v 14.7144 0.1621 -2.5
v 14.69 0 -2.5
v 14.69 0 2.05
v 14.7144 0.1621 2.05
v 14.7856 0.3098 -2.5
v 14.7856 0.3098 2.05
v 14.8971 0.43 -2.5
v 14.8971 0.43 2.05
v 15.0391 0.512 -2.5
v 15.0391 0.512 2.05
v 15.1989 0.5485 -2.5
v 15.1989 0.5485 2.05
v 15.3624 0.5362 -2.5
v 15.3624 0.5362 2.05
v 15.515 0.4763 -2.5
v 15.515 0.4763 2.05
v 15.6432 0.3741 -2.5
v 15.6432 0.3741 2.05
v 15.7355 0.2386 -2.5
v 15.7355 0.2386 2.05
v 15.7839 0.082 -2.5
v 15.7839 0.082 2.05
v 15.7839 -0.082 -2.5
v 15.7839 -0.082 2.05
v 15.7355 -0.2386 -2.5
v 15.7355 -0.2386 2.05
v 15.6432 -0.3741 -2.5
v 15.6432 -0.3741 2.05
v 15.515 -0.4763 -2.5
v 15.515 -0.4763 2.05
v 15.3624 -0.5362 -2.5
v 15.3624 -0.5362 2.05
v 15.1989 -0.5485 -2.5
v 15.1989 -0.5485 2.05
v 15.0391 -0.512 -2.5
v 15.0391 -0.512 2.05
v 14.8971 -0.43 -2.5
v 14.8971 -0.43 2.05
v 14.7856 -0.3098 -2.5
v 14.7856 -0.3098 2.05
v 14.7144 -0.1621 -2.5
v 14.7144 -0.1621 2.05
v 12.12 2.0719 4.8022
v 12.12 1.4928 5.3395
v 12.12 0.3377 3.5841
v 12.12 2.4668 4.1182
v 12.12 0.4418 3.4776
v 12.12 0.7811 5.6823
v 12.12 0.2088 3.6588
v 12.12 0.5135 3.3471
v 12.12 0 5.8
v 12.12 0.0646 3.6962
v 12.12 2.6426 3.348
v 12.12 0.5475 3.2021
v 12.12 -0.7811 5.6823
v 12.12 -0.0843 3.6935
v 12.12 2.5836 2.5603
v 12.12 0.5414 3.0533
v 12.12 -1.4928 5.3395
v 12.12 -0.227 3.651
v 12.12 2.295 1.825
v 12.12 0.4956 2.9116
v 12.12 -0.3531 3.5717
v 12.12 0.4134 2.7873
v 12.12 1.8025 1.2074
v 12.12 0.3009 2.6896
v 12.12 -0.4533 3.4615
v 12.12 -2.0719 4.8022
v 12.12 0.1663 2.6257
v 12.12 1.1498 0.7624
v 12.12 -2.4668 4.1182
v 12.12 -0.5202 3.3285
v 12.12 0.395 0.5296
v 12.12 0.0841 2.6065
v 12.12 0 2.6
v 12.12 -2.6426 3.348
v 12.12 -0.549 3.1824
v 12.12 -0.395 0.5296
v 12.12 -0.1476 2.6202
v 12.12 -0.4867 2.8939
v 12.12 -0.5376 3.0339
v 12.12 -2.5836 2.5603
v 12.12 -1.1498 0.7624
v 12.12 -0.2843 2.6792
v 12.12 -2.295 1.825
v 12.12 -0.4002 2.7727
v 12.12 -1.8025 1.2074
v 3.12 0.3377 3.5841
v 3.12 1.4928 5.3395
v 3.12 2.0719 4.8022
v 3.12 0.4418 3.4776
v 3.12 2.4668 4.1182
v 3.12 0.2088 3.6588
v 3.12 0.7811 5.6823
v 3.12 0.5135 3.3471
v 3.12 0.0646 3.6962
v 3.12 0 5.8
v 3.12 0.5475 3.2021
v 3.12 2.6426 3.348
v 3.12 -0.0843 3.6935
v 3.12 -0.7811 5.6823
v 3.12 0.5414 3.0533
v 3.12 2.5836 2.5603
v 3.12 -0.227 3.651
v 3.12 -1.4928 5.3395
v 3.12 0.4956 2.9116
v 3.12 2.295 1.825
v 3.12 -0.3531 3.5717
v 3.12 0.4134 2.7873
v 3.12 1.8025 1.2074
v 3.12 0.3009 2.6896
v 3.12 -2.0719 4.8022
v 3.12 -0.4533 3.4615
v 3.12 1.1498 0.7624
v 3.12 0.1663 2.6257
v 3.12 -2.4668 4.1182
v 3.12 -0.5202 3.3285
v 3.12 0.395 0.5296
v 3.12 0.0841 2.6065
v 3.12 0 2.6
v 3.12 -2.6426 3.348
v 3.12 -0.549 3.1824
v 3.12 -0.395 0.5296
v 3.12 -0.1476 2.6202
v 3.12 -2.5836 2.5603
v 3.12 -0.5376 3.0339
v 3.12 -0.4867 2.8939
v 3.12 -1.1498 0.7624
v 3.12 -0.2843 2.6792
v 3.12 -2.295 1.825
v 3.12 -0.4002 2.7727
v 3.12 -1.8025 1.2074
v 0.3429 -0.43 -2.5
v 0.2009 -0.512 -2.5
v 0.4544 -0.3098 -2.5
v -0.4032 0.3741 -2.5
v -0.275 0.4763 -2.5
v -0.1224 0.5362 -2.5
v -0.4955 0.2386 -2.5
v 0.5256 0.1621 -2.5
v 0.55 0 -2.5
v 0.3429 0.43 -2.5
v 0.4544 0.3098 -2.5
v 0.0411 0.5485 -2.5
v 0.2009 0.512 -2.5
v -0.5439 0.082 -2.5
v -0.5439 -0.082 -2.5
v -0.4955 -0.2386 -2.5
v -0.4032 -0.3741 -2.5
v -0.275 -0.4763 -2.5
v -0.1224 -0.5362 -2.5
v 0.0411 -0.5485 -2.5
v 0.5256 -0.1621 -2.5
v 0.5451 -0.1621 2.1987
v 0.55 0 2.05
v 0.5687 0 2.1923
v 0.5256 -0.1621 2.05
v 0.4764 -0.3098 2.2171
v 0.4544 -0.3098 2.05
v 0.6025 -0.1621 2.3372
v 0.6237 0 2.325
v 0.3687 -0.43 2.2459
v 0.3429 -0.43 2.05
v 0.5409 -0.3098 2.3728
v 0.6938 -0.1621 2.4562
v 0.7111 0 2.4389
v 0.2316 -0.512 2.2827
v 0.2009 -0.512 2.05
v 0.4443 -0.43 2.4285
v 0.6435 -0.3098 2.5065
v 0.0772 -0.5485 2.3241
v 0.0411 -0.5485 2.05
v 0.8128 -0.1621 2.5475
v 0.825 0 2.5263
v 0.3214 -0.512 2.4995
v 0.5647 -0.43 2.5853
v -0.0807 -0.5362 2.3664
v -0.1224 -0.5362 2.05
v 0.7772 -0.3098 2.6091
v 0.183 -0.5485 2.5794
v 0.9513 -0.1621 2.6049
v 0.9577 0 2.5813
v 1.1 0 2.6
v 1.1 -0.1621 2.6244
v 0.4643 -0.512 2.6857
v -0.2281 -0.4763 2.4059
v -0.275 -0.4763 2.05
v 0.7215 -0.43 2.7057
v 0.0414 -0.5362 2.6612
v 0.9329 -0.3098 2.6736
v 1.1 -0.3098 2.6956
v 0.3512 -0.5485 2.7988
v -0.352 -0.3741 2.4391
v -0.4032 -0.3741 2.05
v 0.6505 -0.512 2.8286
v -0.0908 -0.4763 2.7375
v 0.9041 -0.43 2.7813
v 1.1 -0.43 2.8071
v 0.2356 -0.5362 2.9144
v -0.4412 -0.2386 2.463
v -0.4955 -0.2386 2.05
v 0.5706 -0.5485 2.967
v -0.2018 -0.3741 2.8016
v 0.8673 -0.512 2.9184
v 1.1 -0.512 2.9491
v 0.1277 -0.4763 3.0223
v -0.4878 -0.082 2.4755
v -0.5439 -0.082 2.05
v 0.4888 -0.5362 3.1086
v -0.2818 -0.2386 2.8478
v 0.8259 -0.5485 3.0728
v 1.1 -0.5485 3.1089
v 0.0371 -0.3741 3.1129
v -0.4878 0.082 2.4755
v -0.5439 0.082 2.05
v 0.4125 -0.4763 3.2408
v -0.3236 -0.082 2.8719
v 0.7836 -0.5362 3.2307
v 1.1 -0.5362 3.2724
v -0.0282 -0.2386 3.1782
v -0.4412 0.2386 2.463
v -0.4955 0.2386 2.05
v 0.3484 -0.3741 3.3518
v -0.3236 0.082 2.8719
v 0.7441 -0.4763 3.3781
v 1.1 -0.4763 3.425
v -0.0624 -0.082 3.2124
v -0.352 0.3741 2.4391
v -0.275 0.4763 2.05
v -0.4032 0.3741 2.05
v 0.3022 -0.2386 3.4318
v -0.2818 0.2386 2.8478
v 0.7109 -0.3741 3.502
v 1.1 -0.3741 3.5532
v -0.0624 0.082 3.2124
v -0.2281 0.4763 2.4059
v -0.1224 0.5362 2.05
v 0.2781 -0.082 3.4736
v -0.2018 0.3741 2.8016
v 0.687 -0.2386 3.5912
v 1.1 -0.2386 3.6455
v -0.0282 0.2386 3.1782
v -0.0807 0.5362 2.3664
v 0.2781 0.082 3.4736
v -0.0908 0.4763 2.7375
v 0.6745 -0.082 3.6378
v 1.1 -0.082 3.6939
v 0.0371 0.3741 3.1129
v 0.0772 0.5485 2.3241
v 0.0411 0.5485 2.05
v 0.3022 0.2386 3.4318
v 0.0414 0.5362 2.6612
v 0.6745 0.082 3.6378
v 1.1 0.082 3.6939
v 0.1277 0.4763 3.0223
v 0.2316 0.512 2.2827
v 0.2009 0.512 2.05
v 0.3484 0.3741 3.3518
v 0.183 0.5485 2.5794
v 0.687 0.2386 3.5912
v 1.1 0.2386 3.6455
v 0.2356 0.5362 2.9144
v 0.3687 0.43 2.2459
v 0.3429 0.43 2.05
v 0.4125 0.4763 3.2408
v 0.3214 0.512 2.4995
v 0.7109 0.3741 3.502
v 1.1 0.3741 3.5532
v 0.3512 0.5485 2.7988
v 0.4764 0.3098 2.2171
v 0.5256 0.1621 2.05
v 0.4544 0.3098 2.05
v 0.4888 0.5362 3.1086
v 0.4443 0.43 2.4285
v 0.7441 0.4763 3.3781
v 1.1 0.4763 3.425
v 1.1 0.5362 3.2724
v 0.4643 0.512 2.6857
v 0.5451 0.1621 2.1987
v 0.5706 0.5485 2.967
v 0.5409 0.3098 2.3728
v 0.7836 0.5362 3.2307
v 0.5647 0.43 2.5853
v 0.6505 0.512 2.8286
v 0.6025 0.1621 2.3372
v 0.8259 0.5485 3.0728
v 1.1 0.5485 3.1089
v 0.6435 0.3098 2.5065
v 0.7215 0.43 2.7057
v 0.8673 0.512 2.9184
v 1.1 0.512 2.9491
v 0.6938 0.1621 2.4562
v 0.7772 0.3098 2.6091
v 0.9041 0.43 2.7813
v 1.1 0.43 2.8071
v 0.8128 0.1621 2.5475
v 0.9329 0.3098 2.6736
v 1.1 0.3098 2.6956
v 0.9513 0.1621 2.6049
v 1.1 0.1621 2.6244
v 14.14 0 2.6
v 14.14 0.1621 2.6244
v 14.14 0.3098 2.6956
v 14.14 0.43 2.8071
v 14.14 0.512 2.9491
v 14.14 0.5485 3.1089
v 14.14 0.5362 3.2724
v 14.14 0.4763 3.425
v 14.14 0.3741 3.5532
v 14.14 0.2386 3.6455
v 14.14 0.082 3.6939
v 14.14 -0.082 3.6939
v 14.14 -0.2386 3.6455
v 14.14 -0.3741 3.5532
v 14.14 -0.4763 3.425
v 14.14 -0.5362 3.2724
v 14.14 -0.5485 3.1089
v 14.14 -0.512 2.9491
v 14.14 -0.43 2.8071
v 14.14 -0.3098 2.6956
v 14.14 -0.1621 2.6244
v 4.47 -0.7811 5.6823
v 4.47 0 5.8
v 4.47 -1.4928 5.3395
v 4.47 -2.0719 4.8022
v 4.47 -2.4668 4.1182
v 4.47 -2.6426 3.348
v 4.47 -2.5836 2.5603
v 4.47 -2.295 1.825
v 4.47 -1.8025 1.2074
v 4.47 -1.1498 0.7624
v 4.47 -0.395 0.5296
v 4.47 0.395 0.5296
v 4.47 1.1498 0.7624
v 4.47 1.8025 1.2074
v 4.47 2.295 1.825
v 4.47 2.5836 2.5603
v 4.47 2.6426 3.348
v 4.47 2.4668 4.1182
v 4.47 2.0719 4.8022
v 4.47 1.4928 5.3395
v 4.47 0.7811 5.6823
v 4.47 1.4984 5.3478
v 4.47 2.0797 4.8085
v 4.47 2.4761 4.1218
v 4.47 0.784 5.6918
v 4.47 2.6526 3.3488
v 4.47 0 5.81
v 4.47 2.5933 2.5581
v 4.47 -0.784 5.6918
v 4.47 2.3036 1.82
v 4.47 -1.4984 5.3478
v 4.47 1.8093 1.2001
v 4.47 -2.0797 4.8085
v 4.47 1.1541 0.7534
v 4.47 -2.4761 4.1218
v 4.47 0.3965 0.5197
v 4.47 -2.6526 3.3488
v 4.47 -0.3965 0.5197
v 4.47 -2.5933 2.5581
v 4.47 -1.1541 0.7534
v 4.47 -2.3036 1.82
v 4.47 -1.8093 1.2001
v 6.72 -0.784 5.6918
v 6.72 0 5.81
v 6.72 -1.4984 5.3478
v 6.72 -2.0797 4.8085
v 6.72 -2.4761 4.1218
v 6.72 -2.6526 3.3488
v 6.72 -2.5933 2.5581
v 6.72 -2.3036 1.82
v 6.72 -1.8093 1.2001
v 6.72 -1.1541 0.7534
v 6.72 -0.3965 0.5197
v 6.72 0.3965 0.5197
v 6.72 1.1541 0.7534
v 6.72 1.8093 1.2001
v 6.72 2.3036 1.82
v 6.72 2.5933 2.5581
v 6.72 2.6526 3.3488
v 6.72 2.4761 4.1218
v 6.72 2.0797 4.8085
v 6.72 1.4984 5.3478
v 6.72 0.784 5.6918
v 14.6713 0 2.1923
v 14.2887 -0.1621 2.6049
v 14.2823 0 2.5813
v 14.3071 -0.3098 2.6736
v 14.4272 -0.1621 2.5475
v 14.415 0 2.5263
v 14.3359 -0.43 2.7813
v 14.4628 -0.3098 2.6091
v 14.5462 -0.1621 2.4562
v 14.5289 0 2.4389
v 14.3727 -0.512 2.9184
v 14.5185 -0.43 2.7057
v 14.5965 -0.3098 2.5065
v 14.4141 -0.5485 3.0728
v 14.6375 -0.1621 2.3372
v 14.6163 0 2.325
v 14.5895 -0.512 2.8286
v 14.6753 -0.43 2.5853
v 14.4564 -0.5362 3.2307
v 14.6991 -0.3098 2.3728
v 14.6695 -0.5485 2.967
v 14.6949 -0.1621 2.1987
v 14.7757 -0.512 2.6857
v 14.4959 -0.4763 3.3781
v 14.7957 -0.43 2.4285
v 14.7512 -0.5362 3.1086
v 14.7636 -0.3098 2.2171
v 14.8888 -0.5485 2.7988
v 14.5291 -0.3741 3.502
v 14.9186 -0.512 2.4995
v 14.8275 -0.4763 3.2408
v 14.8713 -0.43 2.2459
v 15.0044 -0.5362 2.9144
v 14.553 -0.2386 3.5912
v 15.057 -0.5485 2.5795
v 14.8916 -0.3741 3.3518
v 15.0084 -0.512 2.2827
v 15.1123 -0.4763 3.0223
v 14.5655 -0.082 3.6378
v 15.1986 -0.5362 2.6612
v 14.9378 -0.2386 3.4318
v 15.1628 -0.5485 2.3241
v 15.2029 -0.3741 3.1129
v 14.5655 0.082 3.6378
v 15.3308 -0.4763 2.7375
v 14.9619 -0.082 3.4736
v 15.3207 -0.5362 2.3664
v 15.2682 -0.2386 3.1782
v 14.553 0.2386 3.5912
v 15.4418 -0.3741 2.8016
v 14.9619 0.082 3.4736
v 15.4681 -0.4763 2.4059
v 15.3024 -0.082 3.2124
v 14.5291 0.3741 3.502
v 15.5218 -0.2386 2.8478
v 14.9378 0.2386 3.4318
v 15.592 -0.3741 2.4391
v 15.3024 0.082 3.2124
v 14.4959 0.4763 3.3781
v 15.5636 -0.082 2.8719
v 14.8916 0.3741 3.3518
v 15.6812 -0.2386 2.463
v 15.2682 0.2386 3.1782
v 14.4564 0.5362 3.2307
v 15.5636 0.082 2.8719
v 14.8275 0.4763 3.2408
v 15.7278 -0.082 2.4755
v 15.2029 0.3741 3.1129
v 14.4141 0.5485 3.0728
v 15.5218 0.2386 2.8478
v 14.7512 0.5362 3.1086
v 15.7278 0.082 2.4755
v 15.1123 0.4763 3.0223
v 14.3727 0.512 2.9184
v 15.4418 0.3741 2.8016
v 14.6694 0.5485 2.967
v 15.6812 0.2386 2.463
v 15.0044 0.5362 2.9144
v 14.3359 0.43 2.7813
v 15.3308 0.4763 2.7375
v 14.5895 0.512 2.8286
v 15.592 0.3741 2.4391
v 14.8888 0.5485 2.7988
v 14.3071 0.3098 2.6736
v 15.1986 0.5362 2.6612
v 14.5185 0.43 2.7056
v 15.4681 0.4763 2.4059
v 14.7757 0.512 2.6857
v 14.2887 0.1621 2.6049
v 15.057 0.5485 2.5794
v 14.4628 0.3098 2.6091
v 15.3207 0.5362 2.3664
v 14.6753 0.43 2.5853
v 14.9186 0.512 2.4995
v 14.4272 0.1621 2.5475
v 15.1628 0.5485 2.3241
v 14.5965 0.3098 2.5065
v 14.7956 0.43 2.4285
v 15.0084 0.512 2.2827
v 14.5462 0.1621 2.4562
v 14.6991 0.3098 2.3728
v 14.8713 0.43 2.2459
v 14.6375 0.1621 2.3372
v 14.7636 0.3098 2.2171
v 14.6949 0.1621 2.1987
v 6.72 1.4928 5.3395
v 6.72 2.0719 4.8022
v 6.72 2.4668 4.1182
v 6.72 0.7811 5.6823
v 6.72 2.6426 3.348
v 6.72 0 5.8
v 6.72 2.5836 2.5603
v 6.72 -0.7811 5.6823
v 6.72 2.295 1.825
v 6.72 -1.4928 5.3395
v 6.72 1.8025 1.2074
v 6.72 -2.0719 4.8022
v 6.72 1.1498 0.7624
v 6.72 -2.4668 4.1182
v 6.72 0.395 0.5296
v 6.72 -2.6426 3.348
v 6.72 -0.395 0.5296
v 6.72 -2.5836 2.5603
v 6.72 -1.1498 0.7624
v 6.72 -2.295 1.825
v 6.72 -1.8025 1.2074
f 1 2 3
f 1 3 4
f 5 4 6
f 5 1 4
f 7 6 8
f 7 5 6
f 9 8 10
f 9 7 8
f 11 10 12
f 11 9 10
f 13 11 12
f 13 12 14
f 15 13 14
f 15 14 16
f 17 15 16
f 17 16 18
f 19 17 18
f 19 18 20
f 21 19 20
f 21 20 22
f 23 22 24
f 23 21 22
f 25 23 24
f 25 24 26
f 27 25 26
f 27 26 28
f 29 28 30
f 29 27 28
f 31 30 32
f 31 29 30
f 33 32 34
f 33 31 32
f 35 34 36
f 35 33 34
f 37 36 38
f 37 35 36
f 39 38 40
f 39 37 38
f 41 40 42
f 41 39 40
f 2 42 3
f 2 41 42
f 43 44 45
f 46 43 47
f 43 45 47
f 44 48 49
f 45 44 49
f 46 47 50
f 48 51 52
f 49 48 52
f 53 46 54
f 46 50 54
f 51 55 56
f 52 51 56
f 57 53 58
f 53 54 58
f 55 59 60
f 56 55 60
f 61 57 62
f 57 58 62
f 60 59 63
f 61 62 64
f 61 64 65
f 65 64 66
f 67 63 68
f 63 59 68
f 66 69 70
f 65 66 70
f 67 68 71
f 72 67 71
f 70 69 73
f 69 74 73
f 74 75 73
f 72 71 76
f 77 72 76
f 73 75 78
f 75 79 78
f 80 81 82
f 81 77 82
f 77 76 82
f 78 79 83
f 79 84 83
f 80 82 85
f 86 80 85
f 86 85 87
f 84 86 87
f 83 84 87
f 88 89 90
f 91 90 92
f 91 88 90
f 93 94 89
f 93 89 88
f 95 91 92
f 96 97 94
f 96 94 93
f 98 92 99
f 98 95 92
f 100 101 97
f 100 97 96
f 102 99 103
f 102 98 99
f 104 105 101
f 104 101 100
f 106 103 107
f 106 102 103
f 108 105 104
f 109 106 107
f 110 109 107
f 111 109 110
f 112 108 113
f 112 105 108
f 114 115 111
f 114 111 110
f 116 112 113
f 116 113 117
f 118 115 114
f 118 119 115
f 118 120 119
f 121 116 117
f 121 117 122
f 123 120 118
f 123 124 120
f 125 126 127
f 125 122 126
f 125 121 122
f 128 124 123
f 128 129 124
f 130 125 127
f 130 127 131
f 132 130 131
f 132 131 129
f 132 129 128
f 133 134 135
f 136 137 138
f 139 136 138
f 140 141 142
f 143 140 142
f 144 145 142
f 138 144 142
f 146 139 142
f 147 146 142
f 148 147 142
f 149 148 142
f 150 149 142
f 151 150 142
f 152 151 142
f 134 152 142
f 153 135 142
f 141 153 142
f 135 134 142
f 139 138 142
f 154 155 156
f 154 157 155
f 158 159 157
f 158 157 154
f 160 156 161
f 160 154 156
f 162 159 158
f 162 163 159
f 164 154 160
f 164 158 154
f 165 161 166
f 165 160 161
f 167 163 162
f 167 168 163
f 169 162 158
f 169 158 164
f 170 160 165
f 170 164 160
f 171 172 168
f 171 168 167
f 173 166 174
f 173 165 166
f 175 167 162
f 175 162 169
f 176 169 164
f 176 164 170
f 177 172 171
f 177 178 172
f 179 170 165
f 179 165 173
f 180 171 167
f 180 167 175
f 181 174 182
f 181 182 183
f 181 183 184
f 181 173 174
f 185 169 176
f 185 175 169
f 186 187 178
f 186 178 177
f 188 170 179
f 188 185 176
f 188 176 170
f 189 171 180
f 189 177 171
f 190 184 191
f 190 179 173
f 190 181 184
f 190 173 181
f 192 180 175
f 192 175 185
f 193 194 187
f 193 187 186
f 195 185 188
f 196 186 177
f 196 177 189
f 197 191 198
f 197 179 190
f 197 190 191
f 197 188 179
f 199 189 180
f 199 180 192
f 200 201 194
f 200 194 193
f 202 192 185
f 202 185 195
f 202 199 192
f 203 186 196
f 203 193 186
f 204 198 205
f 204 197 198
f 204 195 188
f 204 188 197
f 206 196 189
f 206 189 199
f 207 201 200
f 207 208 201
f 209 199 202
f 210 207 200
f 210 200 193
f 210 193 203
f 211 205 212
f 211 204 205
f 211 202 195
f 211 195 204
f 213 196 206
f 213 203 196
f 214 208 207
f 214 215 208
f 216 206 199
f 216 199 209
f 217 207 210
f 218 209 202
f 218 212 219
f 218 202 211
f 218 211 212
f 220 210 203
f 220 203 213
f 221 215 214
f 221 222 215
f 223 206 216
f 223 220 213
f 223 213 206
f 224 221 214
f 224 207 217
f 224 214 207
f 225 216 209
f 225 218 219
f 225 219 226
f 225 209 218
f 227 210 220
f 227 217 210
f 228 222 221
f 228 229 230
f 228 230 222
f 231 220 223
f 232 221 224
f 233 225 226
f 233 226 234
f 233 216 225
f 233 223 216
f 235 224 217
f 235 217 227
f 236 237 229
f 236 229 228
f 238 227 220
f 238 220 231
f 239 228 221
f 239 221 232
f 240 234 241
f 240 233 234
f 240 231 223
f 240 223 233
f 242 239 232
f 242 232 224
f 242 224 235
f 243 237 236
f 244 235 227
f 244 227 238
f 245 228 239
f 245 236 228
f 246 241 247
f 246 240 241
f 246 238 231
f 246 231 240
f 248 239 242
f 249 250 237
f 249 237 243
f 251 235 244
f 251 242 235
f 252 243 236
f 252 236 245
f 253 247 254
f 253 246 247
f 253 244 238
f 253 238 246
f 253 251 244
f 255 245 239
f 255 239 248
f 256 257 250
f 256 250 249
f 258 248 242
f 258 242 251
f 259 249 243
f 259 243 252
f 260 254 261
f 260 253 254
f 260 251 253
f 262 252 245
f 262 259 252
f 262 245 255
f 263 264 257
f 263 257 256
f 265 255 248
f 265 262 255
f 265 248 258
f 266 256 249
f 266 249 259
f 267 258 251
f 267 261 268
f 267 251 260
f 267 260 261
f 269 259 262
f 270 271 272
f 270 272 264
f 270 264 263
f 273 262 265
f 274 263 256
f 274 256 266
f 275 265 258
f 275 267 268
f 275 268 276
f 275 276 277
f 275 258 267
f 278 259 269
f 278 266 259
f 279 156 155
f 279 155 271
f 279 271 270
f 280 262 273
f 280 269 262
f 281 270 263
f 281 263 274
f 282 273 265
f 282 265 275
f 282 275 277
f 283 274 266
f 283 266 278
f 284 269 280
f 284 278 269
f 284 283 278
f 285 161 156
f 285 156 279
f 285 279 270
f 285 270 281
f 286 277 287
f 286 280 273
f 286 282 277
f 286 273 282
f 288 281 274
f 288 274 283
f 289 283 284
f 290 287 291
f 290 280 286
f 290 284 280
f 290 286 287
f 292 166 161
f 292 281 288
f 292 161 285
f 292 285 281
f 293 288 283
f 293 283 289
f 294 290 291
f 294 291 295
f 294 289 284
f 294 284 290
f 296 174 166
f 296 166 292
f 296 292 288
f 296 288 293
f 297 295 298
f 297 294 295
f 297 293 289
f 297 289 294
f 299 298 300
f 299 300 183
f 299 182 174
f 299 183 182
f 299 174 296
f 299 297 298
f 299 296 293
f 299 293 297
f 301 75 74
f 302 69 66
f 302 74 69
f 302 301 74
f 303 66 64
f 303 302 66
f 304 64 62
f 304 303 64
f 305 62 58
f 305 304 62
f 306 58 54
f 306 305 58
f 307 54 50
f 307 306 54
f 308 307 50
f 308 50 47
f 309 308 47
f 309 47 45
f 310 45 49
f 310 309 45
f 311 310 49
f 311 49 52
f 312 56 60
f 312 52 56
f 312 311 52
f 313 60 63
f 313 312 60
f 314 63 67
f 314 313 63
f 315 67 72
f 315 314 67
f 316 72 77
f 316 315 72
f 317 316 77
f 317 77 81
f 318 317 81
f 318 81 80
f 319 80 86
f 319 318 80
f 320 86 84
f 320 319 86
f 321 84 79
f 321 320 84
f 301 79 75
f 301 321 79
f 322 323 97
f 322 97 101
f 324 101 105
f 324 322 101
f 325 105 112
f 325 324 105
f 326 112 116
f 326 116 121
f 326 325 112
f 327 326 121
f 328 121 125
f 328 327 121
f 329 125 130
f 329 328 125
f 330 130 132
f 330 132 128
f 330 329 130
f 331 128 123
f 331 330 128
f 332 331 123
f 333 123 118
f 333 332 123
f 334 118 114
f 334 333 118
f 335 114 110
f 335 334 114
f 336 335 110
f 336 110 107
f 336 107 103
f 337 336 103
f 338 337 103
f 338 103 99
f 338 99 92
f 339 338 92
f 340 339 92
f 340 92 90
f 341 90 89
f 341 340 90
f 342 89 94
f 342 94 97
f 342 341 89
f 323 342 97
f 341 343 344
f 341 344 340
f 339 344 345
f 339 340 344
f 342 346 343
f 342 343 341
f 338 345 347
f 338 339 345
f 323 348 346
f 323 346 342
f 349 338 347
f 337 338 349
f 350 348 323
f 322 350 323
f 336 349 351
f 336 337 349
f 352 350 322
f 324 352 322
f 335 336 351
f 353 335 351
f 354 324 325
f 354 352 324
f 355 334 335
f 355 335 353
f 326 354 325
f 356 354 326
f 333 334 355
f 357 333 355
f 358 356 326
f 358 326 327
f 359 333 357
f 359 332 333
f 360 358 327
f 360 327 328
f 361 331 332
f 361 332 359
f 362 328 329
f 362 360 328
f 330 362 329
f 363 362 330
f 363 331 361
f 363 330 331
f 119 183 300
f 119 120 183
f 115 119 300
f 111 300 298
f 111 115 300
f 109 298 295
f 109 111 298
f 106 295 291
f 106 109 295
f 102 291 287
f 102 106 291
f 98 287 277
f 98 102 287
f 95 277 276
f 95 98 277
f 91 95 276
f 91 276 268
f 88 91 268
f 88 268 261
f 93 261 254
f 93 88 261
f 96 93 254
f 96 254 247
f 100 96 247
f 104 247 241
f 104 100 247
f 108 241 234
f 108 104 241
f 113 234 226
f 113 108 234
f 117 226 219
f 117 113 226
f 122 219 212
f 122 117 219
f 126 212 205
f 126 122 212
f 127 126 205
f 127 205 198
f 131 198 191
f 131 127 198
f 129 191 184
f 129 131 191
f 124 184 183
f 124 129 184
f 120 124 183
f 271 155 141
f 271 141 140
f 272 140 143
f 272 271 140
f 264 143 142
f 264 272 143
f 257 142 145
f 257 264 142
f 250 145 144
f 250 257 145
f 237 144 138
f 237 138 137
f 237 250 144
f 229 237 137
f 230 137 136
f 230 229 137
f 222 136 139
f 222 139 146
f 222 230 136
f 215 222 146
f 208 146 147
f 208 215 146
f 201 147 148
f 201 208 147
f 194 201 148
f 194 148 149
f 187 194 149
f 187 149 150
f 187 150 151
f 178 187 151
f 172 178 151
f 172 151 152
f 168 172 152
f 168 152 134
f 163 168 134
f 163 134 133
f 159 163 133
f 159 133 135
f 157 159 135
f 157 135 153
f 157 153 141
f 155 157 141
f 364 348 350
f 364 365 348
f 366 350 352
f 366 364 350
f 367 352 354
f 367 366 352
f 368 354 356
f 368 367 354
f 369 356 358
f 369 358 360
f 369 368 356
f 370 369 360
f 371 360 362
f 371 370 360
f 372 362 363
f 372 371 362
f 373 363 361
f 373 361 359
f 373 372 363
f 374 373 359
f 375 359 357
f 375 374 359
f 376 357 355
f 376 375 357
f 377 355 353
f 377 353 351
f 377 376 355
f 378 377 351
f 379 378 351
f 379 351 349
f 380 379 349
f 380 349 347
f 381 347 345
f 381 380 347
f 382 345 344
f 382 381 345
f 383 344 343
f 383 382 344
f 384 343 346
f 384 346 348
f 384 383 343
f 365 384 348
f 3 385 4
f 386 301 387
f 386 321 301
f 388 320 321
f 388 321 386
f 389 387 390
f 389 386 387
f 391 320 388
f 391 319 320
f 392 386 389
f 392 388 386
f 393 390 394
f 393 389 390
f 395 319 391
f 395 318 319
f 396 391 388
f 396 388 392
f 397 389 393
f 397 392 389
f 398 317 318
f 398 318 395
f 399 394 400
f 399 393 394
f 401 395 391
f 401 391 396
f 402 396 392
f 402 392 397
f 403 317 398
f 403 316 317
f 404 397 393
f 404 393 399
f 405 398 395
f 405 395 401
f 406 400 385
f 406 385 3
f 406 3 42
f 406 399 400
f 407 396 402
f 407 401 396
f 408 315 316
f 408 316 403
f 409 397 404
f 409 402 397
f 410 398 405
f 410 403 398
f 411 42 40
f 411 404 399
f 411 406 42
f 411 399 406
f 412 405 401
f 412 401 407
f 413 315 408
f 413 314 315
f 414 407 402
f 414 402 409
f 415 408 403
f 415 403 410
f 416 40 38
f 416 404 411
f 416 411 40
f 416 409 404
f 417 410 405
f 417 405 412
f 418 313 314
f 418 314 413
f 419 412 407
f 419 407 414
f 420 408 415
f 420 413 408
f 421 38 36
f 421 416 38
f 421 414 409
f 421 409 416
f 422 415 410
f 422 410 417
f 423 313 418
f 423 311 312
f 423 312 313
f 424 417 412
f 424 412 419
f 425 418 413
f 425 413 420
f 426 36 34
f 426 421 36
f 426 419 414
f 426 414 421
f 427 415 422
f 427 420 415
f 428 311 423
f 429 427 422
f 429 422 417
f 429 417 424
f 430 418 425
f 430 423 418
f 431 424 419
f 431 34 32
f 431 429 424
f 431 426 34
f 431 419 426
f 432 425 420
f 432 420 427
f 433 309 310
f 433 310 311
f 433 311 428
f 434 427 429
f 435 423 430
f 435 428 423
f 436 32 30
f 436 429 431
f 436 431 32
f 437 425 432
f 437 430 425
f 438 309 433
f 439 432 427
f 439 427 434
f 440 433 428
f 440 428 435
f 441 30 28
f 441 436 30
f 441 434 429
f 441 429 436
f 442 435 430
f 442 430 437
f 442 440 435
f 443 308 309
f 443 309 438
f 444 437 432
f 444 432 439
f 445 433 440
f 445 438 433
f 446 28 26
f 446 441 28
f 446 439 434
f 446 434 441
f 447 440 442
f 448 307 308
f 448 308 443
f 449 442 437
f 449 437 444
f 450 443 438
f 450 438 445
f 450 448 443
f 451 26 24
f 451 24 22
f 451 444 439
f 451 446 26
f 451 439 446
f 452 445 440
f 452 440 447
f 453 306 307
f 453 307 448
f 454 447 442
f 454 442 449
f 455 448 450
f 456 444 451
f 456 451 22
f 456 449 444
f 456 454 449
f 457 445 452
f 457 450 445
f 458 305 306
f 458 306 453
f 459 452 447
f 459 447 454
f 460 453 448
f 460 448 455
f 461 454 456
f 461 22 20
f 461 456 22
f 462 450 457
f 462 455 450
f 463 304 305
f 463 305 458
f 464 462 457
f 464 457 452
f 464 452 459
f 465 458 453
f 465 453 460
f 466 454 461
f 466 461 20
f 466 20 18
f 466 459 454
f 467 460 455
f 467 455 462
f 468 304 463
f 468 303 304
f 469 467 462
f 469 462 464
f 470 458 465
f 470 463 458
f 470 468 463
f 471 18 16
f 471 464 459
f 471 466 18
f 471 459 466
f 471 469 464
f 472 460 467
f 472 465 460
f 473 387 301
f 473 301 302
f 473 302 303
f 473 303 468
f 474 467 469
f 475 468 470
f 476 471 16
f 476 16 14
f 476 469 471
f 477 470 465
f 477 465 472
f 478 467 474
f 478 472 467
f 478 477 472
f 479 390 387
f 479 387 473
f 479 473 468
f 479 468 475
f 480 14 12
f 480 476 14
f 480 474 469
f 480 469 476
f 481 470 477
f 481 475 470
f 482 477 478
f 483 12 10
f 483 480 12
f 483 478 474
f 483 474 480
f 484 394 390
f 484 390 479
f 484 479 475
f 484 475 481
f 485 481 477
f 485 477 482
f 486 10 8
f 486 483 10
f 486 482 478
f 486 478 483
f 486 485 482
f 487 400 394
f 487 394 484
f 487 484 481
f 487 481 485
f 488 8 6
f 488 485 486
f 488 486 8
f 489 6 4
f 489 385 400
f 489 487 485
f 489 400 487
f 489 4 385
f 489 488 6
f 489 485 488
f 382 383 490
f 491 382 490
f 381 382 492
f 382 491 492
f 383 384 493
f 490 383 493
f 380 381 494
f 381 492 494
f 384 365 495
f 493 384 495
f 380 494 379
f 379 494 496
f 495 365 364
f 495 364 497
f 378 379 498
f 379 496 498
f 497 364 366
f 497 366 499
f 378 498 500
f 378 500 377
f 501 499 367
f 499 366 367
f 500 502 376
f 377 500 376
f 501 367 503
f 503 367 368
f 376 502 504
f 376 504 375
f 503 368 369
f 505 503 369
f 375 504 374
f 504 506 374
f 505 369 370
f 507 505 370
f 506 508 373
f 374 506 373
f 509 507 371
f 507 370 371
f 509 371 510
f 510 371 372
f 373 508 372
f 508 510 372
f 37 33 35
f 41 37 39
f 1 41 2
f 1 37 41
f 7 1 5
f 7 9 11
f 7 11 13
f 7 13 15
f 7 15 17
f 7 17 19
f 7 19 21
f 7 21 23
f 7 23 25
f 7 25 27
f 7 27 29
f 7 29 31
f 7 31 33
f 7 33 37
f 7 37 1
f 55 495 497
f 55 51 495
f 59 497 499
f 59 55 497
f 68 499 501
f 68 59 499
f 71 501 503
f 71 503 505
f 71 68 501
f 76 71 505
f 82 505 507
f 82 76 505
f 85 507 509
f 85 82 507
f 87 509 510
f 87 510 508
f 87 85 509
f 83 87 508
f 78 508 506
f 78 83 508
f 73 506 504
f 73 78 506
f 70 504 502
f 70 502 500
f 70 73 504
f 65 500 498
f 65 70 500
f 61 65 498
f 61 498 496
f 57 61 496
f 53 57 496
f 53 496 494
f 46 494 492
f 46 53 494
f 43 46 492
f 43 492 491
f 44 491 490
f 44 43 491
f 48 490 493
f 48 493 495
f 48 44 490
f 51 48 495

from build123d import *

# Parameters (mm, degrees)
SKETCH002_W = 9
SKETCH002_H = 2.65
SKETCH_R    = 0.55
SKETCH003_W = 2.25
SKETCH003_H = 0.02


with BuildPart() as revolution:
    # Sketch002 → Revolution (revolve)
    with BuildSketch(Plane.XZ):
        with Locations((7.62, 4.475)):
            Rectangle(SKETCH002_W, SKETCH002_H)
    revolve(axis=Axis((3.12, 0, 3.15), (1, 0, 0)))


with BuildPart() as sweep_body:
    # Sweep: sweep along a path in Sketch001
    with BuildLine(Plane.XZ) as sweep_path:
        Line((0, -2.5), (0, 2.05))
        ThreePointArc((0, 2.05), (0.322183, 2.827817), (1.1, 3.15))
        Line((1.1, 3.15), (14.14, 3.15))
        ThreePointArc((14.14, 3.15), (14.917817, 2.827817), (15.24, 2.05))
        Line((15.24, 2.05), (15.24, -2.5))
    # Sketch → Sweep (sweep)
    with BuildSketch(Plane.XY.offset(-2)):
        Circle(SKETCH_R)
    sweep(path=sweep_path.line)


with BuildPart() as d_do_201ae_p15_24mm_horizontal:
    # Sketch003 → Revolution001 (revolve)
    with BuildSketch(Plane.XZ):
        with Locations((5.595, 5.8)):
            Rectangle(SKETCH003_W, SKETCH003_H)
    revolve(axis=Axis((0, 0, 3.15), (1, 0, 0)))

    # Revolution001_mp_cp: union Revolution, Sweep body
    add(revolution.part)
    add(sweep_body.part)


solid = d_do_201ae_p15_24mm_horizontal.part
